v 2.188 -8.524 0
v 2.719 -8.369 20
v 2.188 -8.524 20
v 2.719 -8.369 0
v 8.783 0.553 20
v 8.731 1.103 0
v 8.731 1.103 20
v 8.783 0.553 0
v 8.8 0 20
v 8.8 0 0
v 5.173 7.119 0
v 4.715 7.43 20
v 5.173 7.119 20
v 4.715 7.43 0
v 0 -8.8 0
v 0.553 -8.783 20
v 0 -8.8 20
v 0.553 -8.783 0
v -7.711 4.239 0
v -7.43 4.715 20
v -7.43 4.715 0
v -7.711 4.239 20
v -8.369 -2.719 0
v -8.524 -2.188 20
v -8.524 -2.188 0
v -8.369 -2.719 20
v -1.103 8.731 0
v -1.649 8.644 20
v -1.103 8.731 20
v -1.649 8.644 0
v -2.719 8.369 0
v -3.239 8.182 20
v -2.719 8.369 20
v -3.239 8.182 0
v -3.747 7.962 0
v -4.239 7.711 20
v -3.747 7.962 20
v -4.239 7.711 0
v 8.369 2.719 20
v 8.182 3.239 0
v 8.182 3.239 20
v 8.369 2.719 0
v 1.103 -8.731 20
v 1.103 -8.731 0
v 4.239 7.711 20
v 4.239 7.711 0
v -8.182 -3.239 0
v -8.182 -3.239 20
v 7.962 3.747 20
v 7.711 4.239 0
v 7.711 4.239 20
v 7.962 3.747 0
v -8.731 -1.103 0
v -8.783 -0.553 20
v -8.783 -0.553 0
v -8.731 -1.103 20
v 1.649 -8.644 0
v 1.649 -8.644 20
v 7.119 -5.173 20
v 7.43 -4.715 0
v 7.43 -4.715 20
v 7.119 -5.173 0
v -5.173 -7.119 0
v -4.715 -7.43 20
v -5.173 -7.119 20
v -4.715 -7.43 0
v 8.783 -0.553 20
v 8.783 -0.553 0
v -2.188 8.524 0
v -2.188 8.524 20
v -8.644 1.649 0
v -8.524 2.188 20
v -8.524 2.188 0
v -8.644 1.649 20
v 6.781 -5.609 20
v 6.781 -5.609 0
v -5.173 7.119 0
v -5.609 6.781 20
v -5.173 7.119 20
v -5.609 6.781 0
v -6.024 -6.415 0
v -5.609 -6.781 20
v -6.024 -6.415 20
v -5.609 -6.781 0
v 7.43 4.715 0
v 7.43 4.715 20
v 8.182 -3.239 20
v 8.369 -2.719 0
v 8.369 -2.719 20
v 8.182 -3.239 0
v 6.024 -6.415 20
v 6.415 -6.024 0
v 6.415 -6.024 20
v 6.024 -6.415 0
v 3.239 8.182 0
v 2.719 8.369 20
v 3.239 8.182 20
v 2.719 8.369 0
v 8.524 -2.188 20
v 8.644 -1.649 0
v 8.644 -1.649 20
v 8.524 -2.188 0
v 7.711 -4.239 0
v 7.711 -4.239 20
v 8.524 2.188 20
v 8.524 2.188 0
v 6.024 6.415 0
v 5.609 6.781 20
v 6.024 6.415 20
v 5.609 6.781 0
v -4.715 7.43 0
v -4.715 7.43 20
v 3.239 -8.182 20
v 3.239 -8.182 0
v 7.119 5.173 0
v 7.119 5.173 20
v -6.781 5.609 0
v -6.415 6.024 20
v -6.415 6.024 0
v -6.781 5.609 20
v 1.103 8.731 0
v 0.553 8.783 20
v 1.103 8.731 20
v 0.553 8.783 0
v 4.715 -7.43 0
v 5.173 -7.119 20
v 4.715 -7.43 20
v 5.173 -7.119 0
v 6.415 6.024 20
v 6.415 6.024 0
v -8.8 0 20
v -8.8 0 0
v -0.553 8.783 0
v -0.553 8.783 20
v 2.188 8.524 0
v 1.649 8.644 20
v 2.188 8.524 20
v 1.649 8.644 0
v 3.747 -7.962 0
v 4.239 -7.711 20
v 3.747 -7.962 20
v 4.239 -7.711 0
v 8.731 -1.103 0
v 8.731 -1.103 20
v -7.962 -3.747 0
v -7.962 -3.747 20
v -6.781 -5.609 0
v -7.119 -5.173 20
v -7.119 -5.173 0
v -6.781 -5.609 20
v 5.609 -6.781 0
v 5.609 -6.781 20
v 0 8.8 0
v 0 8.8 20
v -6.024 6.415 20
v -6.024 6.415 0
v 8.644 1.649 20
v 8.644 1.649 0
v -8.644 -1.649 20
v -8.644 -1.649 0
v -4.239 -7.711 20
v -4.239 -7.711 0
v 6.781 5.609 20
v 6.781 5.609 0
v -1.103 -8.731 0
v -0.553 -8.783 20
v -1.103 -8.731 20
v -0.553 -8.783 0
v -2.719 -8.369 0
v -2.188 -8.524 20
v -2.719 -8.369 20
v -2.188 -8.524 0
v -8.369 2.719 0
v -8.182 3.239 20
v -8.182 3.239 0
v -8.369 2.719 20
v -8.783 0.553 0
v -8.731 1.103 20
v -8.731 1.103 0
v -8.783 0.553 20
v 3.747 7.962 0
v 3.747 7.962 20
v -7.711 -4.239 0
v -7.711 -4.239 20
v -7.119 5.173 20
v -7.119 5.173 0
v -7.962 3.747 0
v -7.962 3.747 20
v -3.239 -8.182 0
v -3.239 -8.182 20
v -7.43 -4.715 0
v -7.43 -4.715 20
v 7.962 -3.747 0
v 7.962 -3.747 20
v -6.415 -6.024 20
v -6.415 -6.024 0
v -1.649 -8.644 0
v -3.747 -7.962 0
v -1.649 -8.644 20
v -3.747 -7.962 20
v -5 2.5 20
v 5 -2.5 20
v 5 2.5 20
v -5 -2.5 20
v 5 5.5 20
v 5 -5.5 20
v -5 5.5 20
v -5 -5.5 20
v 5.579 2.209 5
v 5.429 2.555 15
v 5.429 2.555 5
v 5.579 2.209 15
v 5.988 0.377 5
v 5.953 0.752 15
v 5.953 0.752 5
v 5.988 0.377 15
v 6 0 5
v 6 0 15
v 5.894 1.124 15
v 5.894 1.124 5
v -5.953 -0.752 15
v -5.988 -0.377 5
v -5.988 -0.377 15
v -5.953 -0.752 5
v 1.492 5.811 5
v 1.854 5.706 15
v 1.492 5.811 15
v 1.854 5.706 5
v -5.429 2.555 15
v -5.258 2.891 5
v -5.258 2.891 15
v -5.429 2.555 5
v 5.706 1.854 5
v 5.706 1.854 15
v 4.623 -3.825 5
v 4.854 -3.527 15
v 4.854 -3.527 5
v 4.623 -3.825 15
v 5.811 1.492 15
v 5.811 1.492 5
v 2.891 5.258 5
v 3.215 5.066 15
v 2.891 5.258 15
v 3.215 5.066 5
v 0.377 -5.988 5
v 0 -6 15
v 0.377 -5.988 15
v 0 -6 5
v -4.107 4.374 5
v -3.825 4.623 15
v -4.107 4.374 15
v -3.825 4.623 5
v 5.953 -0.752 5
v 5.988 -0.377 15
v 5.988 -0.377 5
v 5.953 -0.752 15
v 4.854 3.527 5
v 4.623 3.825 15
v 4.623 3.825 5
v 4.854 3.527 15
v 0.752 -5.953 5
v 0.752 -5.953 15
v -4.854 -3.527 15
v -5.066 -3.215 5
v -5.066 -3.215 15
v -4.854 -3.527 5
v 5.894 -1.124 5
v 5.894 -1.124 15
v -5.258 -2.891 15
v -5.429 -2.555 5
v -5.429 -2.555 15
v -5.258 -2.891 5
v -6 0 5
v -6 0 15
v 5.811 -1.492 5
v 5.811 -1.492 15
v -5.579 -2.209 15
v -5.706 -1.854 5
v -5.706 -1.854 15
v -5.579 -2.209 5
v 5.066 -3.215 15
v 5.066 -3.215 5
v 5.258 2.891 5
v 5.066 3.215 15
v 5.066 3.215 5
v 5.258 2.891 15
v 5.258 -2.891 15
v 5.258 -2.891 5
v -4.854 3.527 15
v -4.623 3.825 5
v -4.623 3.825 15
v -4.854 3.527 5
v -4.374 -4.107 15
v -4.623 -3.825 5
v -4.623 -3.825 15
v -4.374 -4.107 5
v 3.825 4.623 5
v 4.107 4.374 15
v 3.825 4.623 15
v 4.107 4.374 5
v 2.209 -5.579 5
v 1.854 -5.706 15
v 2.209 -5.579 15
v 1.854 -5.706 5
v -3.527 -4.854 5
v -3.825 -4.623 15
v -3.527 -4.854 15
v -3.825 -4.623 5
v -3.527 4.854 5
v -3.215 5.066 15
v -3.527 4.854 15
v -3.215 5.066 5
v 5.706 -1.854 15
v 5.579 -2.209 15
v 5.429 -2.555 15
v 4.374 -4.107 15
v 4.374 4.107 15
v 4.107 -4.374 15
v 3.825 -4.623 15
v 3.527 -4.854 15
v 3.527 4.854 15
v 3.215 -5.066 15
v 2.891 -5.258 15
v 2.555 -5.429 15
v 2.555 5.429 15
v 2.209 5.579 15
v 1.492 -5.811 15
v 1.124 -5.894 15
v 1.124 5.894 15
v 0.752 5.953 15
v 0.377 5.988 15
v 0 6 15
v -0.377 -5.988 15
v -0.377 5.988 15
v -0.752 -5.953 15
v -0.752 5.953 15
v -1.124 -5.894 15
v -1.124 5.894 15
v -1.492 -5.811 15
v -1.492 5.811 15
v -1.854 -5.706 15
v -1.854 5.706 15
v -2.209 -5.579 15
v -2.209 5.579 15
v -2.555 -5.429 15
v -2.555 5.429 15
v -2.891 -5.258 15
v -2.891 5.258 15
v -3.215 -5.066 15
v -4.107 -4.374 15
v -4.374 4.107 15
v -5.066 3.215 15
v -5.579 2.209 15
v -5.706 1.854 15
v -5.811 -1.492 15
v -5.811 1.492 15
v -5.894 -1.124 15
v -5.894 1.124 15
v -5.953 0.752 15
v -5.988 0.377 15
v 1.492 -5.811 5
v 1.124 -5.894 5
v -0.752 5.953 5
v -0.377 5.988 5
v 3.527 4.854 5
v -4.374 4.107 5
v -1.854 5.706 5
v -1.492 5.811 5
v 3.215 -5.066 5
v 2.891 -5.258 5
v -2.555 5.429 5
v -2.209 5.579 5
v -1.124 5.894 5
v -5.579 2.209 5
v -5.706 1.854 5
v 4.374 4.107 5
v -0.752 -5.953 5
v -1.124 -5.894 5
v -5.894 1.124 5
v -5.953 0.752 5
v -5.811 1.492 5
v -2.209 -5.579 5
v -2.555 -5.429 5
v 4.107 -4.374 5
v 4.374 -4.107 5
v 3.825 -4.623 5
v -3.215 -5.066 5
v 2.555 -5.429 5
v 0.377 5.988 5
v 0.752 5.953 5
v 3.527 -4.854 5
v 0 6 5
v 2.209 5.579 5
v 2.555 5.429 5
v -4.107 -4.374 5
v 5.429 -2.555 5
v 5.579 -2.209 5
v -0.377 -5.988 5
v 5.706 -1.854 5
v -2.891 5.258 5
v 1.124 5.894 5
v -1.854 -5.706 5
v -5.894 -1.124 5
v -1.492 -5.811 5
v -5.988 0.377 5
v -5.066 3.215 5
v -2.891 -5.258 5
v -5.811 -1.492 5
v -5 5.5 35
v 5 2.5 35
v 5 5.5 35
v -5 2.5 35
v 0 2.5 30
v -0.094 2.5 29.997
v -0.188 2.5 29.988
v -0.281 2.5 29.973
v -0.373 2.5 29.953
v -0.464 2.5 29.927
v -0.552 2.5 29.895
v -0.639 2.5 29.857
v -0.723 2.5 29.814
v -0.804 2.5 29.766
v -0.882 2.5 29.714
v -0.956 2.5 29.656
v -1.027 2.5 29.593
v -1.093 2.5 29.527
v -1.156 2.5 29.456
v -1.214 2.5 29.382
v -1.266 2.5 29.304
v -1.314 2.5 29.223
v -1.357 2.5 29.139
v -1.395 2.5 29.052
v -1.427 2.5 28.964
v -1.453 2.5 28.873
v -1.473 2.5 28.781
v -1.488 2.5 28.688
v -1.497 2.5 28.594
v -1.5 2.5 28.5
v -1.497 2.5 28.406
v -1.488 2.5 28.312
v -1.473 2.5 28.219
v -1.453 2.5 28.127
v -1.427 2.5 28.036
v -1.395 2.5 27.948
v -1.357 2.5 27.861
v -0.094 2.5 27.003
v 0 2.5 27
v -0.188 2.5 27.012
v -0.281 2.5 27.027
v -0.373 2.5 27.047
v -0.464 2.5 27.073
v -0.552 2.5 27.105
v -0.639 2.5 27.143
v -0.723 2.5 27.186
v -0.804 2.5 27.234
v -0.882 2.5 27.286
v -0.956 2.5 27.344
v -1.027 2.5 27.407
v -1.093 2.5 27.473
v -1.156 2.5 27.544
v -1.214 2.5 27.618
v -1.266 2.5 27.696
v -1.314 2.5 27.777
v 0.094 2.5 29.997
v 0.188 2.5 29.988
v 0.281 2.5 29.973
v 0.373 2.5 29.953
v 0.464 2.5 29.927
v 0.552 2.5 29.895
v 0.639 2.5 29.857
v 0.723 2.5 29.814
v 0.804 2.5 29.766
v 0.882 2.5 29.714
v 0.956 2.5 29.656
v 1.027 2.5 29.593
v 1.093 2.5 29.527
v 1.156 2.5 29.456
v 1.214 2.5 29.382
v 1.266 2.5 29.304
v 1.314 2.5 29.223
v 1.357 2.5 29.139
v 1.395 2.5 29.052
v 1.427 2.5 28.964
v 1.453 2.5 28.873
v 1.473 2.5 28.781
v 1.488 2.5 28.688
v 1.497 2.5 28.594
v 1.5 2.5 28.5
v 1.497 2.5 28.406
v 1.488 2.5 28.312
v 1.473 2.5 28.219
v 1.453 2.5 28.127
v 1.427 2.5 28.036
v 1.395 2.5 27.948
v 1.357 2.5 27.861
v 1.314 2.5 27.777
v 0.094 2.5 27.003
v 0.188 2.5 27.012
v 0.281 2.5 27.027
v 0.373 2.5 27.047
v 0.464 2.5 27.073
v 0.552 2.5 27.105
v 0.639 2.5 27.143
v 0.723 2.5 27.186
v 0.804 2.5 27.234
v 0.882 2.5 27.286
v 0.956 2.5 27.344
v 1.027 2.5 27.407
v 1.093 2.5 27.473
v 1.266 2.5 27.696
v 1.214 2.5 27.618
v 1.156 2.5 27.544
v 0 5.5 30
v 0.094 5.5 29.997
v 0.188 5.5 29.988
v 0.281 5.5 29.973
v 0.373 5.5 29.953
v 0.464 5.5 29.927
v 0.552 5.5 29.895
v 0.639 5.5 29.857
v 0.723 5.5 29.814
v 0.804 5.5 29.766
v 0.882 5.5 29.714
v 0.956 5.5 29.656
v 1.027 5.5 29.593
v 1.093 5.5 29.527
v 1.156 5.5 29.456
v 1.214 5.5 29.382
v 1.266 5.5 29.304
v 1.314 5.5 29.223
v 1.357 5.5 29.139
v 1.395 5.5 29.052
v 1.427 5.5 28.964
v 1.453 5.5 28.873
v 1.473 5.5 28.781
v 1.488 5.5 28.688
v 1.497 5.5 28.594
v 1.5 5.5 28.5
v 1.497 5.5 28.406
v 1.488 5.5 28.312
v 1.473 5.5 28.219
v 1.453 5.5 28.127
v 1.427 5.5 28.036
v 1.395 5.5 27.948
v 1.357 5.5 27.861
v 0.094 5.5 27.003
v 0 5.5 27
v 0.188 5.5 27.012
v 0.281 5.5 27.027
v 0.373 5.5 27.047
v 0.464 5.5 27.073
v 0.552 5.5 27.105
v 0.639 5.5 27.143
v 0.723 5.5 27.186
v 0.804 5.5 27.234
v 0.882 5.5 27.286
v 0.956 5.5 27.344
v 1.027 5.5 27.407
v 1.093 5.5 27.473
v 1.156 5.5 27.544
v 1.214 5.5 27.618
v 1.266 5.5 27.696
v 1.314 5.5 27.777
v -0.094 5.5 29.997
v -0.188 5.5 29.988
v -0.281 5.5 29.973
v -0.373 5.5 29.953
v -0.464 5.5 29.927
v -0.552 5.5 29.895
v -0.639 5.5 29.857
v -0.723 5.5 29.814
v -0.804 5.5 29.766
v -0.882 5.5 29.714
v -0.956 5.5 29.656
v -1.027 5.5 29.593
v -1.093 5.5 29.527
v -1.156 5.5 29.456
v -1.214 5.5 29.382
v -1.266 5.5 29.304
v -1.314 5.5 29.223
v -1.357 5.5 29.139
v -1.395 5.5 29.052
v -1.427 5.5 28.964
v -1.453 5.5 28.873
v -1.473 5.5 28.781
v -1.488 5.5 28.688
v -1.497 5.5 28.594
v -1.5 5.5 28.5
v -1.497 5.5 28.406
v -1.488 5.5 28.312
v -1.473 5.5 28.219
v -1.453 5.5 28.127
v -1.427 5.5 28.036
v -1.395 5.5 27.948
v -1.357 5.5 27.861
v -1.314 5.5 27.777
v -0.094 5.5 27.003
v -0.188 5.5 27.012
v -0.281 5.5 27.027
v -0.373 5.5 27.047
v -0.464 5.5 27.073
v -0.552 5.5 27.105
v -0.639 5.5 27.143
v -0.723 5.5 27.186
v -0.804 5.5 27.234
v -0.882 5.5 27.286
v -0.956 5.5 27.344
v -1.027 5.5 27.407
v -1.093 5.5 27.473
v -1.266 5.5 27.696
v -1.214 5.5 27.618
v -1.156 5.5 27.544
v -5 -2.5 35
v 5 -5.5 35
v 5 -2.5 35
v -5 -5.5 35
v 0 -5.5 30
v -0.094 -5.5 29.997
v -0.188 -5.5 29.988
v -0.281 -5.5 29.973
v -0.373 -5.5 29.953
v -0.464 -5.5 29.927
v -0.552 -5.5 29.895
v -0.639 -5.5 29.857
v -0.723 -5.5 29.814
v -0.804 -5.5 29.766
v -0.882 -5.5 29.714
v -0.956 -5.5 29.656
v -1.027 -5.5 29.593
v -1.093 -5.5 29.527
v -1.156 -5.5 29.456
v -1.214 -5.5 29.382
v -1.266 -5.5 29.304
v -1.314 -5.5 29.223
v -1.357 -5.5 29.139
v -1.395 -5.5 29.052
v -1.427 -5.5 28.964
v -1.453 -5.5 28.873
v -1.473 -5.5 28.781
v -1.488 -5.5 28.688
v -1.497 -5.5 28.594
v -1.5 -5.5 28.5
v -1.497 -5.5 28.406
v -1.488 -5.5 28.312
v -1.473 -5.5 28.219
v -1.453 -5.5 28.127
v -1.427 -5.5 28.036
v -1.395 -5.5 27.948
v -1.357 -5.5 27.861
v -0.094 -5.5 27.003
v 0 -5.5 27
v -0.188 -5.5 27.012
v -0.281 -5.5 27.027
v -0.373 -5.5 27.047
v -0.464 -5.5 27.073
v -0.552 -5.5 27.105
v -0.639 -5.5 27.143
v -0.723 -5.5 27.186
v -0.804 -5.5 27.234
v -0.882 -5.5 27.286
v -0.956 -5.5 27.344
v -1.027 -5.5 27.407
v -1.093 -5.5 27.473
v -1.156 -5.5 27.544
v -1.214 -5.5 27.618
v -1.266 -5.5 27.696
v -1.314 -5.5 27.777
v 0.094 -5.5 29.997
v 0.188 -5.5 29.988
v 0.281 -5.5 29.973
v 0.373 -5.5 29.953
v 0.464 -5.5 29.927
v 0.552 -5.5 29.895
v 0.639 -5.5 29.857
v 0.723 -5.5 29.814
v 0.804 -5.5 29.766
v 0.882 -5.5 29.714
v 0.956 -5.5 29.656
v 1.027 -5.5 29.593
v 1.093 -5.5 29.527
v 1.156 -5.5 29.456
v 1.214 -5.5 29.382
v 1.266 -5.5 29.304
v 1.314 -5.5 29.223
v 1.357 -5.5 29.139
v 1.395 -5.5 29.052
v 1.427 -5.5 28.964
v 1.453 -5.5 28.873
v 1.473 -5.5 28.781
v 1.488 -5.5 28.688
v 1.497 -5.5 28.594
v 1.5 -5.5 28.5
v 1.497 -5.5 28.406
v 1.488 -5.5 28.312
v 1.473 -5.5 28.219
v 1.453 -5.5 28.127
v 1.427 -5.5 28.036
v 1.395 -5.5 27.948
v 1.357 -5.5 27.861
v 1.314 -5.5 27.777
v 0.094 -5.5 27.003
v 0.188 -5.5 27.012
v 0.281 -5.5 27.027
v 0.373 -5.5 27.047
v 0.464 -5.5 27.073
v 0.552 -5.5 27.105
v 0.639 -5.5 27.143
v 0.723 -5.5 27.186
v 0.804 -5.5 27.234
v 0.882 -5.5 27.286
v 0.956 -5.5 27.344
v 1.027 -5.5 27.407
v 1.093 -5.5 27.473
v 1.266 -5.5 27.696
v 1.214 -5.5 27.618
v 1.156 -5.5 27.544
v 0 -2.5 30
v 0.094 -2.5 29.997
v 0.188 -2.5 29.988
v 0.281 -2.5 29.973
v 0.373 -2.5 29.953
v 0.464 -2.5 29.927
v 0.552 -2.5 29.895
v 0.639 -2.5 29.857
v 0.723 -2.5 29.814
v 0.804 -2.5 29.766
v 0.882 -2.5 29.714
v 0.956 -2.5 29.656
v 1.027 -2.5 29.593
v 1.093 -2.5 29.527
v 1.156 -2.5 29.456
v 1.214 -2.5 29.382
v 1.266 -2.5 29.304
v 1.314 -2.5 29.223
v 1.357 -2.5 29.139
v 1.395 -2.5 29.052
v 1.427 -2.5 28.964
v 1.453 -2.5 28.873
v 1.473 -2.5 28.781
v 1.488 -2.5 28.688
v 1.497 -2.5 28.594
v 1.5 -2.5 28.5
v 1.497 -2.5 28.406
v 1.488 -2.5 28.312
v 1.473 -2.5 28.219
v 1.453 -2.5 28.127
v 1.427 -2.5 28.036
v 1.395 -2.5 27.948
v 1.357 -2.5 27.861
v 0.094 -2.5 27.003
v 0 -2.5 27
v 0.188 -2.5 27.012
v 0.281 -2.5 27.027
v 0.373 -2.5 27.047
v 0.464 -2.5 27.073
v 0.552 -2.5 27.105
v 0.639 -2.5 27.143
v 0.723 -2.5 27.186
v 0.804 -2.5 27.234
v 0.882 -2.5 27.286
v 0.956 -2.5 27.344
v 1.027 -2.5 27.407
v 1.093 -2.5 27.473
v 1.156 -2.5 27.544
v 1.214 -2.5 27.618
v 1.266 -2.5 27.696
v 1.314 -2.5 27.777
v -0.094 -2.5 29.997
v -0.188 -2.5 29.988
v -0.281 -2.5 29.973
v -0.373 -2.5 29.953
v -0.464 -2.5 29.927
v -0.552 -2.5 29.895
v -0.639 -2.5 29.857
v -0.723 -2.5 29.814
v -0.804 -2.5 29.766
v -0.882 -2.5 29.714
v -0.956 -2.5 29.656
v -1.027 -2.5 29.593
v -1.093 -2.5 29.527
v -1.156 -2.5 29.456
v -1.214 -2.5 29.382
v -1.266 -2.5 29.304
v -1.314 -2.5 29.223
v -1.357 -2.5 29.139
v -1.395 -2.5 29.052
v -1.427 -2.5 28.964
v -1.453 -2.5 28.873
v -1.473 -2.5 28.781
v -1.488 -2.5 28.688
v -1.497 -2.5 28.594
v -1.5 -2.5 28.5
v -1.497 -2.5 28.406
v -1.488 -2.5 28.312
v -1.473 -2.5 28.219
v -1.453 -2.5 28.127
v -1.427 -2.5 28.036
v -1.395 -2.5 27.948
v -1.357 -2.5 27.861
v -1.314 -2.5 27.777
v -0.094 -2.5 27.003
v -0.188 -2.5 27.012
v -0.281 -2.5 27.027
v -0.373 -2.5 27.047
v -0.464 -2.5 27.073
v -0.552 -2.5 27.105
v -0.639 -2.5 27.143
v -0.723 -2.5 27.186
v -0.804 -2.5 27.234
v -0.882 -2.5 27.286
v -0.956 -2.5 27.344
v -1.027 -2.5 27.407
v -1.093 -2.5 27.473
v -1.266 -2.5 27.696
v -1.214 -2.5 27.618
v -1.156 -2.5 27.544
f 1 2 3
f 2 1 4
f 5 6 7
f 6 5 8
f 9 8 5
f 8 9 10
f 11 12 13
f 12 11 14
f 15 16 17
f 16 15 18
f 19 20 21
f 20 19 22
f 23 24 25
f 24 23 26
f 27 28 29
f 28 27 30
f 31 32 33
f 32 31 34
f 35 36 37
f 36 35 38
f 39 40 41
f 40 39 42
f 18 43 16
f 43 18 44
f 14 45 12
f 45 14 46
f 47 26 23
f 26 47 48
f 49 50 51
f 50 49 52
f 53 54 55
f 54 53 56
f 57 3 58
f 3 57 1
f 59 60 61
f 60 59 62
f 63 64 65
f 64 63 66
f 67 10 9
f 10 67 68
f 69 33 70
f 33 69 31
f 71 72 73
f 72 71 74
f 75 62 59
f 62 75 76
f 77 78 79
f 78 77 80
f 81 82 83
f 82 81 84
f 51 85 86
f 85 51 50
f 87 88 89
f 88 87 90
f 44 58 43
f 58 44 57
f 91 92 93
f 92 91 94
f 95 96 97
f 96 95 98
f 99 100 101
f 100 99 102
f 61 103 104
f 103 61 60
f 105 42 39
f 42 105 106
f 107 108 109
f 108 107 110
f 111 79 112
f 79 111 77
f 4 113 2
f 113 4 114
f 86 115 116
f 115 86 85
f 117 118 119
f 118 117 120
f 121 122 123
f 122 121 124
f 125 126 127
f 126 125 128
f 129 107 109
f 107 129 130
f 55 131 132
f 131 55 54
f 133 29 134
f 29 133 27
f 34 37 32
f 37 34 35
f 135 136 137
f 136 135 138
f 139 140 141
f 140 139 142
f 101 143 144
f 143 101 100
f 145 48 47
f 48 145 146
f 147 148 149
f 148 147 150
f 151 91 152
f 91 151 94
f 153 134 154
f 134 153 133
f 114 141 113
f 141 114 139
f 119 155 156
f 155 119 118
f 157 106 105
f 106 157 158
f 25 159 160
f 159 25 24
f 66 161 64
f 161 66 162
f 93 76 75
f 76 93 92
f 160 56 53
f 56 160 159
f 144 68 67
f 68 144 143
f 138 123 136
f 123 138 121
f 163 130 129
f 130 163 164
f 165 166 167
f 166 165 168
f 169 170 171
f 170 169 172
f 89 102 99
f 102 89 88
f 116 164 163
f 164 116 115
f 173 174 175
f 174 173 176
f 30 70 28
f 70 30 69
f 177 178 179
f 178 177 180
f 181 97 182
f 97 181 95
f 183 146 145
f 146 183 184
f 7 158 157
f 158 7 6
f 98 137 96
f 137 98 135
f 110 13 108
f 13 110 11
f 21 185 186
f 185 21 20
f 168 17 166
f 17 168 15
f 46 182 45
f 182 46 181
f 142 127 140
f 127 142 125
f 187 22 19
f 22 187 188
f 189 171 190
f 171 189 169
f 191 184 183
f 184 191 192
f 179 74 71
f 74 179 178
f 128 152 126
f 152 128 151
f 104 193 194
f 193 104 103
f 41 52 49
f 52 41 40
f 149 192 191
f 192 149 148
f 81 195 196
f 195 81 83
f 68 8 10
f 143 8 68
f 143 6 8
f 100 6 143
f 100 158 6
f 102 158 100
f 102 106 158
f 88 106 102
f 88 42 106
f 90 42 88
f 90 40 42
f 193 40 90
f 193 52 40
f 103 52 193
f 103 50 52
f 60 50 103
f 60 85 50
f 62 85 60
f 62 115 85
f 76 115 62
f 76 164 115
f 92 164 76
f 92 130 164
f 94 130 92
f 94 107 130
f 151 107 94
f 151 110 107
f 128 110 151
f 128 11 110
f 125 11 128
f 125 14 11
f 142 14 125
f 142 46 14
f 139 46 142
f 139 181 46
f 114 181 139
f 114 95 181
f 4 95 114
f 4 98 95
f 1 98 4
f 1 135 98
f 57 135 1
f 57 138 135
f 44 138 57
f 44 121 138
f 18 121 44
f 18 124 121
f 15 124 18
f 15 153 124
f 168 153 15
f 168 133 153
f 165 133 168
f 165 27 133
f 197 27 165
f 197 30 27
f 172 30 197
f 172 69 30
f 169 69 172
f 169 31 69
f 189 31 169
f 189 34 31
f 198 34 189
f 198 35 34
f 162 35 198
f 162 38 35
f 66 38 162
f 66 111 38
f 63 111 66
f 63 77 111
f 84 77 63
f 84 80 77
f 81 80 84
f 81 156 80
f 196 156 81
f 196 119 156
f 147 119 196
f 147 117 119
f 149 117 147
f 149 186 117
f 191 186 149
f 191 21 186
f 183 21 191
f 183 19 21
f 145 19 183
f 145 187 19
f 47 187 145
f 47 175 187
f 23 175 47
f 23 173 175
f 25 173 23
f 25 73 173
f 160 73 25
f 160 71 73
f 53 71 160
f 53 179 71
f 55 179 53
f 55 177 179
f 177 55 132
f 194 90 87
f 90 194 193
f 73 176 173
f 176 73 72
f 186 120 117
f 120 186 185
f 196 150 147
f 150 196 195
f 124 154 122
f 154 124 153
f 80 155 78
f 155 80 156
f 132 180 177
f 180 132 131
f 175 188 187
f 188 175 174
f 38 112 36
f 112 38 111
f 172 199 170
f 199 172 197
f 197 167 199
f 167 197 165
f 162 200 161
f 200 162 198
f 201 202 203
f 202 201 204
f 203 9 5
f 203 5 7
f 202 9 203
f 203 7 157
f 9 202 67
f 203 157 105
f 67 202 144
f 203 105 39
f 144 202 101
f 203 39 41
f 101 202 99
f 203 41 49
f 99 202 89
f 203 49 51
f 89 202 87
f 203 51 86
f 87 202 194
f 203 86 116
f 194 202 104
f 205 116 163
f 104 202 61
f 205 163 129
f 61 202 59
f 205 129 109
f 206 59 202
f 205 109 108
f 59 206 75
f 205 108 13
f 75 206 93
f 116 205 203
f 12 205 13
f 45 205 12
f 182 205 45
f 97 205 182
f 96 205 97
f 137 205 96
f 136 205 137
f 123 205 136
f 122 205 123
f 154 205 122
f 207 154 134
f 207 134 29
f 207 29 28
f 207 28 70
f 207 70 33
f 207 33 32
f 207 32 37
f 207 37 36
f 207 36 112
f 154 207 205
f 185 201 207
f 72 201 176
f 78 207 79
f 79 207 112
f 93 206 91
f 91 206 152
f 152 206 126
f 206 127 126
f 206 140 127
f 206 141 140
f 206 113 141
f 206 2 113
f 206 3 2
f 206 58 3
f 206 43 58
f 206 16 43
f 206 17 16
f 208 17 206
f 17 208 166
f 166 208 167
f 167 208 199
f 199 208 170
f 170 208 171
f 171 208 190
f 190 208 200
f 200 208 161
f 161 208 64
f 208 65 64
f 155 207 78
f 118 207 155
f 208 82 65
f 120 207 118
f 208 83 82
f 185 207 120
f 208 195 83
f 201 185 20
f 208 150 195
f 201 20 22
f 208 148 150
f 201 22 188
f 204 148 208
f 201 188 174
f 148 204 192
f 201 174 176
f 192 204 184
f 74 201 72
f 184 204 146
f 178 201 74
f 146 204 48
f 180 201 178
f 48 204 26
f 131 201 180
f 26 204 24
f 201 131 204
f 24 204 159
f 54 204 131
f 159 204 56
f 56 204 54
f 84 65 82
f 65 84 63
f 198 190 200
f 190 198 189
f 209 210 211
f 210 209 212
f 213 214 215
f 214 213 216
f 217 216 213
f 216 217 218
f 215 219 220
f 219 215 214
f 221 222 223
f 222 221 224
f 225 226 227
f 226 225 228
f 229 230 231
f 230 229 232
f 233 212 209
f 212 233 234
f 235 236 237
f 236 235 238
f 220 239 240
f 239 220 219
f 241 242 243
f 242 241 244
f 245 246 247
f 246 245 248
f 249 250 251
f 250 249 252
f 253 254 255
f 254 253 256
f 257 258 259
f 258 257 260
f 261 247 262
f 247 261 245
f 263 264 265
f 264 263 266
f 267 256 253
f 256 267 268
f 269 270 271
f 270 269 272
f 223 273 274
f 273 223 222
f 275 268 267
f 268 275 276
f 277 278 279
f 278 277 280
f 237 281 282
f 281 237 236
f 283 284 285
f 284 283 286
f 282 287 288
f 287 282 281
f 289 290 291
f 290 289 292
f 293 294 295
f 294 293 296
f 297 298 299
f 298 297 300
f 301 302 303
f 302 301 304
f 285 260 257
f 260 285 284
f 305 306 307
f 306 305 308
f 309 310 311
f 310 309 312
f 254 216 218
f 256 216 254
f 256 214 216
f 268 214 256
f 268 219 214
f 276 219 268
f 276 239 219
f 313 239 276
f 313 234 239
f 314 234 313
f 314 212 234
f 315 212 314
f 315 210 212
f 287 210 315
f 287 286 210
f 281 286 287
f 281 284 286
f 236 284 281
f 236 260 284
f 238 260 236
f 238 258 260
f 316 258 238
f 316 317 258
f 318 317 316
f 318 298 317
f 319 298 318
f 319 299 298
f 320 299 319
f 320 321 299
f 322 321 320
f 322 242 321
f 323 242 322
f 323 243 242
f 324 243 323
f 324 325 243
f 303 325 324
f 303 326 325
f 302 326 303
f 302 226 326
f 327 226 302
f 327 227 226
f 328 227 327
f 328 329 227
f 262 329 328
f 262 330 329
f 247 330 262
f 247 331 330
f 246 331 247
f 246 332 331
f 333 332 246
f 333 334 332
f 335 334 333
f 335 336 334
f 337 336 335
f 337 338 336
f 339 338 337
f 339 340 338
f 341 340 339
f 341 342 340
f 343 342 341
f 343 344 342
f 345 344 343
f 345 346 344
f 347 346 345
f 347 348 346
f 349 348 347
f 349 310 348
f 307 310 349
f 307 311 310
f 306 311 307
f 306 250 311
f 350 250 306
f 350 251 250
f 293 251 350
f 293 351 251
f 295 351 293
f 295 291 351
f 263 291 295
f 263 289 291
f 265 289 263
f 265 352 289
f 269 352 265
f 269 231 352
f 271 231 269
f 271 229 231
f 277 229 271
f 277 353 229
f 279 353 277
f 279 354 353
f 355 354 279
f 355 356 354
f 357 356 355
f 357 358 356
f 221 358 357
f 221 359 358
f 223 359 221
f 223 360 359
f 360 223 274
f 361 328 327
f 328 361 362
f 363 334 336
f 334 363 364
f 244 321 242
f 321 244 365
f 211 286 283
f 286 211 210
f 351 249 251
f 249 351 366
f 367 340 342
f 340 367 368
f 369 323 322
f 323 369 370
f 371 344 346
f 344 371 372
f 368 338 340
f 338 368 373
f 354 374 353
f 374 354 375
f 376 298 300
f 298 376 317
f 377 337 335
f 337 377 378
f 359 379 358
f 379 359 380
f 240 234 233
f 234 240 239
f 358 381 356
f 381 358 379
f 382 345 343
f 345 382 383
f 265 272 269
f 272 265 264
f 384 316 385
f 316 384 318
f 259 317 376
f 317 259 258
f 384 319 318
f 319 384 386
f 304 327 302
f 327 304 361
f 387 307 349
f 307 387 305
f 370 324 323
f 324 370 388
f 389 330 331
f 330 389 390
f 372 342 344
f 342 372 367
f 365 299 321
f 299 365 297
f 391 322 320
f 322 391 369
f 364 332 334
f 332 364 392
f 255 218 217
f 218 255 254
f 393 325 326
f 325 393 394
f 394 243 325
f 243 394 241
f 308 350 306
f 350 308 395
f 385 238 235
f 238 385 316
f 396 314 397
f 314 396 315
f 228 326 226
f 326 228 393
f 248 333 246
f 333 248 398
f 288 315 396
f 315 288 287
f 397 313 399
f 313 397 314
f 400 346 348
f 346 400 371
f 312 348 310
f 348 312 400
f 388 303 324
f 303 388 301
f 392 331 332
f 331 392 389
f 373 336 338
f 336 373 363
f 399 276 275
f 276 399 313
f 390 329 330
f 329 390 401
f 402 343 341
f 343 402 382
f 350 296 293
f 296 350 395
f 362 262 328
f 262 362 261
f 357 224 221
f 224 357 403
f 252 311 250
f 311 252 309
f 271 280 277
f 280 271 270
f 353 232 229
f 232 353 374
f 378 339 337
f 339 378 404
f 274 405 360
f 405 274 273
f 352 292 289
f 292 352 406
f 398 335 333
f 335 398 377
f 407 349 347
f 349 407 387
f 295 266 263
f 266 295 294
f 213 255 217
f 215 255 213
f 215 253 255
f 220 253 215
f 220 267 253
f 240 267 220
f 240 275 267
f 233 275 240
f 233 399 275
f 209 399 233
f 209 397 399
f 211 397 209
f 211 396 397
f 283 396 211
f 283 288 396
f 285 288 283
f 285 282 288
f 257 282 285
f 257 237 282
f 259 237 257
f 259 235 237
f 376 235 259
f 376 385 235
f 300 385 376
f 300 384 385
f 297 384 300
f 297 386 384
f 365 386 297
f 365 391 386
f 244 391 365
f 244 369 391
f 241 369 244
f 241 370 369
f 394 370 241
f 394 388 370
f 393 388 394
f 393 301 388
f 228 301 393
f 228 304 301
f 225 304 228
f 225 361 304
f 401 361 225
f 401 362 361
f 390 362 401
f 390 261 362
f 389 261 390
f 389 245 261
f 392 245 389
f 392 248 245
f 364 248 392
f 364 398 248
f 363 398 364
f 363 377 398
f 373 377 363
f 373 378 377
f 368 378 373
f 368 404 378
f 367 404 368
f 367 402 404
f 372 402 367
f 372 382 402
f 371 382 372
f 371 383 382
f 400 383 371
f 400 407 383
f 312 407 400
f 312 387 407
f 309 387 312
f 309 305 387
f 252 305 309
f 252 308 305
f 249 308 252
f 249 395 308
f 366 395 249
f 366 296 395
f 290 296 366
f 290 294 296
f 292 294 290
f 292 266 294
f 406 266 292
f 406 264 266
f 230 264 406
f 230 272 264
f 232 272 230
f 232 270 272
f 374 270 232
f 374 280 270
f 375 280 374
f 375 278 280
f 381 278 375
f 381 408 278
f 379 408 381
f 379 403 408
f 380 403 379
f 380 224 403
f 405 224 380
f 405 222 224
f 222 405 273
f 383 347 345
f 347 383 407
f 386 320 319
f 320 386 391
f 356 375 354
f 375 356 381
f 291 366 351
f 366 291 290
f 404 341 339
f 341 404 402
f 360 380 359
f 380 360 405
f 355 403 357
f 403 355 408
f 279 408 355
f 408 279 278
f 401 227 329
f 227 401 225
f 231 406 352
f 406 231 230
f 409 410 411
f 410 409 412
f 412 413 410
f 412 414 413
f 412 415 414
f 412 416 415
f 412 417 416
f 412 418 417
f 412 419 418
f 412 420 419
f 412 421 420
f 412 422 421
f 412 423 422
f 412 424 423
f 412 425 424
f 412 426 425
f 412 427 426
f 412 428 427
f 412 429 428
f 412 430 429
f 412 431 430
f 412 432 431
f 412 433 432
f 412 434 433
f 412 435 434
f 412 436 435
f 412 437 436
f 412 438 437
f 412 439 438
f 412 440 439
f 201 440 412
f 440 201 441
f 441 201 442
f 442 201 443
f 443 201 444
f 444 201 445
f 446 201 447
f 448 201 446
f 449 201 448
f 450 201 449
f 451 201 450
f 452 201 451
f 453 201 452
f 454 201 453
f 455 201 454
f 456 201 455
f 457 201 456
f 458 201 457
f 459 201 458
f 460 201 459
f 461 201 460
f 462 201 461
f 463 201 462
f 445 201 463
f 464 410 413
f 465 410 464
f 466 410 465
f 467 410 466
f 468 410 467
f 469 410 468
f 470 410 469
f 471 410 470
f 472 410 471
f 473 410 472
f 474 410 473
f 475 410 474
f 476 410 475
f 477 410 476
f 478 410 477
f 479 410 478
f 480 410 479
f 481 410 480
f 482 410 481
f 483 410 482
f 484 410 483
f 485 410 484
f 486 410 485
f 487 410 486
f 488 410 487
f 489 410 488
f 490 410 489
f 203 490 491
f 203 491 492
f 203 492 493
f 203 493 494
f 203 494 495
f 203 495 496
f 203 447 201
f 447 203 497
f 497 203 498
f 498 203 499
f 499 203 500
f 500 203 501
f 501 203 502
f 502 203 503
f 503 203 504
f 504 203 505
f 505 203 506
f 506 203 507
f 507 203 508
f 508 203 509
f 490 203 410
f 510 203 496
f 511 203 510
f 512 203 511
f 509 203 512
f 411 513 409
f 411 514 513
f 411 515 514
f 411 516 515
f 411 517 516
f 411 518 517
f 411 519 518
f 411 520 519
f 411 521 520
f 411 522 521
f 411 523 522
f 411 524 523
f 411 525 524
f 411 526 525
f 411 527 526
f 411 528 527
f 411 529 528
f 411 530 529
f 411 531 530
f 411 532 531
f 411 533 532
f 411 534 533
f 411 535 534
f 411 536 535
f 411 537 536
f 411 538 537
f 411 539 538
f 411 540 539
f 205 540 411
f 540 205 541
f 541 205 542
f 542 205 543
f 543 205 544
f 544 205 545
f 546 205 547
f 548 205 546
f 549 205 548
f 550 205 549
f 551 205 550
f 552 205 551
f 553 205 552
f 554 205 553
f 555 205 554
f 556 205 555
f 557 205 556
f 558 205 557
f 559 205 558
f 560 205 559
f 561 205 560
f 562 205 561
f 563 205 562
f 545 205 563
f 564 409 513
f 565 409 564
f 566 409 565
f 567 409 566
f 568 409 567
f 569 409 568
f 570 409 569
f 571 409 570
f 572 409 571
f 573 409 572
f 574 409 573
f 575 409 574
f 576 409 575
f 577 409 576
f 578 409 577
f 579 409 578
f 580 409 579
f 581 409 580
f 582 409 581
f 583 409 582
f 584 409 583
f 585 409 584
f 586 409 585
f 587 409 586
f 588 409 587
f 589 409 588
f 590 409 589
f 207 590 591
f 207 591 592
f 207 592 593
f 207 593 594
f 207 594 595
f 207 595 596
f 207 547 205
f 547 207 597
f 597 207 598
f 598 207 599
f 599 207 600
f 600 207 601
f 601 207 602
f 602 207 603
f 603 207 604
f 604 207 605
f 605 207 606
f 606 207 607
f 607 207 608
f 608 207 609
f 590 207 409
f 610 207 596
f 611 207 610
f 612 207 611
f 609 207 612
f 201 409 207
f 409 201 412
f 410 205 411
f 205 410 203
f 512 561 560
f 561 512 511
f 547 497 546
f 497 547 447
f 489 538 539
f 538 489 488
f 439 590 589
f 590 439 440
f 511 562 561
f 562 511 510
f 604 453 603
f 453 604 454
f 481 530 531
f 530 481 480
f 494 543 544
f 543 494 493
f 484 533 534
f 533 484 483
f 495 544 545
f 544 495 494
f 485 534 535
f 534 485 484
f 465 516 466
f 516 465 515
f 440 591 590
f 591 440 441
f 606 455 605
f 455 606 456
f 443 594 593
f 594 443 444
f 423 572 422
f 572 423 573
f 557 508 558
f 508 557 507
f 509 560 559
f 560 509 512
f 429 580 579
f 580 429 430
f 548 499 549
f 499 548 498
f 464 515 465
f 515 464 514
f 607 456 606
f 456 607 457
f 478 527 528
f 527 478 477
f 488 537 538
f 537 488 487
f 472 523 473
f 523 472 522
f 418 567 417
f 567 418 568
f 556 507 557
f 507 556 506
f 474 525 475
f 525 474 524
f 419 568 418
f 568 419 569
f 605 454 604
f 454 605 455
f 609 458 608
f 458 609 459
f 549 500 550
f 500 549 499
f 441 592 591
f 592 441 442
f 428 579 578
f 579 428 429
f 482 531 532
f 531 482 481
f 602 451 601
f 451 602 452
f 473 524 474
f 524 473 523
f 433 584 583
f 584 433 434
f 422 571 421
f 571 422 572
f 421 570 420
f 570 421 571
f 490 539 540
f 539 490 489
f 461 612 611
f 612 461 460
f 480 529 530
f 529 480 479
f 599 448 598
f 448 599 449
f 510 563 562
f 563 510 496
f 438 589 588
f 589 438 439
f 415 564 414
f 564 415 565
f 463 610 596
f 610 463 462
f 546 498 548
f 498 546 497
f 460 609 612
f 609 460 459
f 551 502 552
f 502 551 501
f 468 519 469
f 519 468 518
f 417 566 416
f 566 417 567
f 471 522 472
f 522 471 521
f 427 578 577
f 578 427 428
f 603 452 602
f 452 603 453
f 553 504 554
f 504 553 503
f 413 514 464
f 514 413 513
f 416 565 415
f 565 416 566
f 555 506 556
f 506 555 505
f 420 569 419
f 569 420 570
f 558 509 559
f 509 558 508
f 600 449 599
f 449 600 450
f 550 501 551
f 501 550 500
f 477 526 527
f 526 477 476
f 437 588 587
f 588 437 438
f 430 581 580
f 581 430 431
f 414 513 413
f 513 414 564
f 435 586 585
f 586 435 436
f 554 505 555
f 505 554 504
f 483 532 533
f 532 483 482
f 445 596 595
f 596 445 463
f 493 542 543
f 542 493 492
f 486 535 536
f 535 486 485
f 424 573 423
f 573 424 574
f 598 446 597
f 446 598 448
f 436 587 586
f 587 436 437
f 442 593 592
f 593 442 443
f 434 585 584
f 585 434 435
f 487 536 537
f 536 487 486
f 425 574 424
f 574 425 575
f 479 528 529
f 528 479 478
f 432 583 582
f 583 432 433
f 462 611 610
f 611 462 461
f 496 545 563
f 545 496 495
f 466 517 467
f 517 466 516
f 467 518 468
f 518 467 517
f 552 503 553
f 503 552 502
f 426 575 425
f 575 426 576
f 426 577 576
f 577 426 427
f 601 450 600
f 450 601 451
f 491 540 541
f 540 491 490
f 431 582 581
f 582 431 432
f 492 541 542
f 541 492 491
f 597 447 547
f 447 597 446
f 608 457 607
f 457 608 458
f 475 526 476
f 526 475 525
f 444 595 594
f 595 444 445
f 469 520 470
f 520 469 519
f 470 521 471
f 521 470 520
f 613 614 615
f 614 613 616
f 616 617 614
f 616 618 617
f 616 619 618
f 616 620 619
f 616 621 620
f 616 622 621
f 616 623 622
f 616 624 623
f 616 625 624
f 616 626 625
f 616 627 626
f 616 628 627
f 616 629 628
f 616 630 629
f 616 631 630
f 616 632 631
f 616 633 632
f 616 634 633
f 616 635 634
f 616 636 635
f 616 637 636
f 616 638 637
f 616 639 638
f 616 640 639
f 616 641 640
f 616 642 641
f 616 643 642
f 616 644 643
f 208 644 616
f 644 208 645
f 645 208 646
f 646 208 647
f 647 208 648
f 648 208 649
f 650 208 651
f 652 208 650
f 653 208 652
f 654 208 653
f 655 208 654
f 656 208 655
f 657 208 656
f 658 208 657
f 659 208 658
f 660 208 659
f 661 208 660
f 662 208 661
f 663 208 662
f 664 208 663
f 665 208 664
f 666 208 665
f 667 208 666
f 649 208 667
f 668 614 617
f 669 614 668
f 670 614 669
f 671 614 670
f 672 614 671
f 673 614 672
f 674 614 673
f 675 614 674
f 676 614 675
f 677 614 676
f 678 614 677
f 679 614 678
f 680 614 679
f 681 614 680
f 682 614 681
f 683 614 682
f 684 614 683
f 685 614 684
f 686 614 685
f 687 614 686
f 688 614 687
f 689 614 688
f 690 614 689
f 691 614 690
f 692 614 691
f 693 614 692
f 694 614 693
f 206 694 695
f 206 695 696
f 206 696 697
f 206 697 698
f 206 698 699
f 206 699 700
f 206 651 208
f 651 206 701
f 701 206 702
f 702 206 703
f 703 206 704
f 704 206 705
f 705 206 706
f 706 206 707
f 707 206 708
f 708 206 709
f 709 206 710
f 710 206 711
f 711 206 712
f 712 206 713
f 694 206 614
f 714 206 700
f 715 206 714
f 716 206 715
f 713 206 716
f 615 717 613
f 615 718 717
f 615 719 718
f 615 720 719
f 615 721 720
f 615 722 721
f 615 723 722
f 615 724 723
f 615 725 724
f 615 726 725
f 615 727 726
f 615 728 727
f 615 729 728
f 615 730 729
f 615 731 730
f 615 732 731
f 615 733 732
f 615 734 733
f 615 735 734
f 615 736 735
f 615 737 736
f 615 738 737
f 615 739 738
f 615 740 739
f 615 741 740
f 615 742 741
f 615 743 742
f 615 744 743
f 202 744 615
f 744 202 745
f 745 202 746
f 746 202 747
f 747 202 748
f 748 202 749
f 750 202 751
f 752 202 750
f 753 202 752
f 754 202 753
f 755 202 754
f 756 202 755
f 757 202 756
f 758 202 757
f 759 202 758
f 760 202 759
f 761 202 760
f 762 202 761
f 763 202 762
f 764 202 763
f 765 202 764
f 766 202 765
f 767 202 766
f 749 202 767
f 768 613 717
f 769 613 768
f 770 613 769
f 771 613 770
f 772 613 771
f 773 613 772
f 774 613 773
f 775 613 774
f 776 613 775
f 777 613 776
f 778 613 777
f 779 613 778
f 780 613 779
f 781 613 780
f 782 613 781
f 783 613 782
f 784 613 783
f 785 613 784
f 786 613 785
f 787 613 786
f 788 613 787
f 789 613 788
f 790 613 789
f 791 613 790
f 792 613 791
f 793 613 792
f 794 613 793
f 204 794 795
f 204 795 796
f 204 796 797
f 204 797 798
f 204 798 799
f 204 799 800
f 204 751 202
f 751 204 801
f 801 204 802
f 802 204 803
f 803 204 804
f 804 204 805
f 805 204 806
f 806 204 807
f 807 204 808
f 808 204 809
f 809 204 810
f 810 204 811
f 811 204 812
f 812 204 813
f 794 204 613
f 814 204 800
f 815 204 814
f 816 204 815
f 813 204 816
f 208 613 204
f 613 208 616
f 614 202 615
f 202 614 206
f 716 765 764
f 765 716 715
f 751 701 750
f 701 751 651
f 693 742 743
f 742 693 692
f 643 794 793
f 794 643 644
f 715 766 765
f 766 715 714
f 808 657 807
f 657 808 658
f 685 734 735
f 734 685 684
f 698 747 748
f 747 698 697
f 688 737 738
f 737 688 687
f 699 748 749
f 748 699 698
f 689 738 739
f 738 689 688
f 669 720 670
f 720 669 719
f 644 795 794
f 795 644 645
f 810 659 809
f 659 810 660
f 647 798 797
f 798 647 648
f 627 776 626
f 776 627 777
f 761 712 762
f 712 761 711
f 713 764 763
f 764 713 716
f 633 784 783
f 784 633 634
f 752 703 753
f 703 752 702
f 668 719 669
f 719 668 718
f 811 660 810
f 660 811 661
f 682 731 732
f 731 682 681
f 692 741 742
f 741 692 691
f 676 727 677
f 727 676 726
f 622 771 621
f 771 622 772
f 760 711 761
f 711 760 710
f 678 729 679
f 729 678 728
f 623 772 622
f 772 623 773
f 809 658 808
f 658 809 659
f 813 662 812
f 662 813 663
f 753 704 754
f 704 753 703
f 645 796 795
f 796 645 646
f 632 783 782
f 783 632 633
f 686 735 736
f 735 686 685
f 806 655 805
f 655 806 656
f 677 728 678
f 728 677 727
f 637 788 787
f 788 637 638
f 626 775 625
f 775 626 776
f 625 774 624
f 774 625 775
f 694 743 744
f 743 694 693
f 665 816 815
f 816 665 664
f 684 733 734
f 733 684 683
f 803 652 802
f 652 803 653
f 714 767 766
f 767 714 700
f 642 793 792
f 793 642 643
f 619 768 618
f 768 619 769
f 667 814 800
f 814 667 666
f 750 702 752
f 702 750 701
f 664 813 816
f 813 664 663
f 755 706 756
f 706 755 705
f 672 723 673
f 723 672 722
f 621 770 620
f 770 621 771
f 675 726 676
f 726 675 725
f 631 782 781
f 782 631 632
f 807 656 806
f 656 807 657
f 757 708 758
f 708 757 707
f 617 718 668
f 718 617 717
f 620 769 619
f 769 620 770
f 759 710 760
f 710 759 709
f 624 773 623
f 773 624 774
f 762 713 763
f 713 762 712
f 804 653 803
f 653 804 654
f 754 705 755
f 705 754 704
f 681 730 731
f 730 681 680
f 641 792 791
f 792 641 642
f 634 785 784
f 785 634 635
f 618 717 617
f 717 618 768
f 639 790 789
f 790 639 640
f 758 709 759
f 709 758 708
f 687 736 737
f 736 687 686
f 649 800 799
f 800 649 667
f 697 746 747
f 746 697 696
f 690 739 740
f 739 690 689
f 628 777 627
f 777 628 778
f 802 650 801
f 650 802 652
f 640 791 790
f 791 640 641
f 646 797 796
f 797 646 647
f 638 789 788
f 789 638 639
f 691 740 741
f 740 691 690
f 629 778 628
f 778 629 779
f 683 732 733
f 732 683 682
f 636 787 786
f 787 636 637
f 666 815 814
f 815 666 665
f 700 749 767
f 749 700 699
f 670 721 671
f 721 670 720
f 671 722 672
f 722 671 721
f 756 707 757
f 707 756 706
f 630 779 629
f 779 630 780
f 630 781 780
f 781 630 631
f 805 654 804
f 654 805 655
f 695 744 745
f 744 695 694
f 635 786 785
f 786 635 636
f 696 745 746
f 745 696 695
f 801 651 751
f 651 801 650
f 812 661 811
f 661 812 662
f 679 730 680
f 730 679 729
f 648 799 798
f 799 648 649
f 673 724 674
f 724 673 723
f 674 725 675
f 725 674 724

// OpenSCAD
//*******************************************************
// ********** Prusa Rounded Clip by MacFly **************
// **            made dec 02 2015                      **
//*******************************************************

//--------------------------------------------------------------------------------------//
$fn = 100;
CYLINDER_HEIGHT = 20;         // cylinder height mm - Hauteur du cylindre en mm
CYLINDER_RADIUS = 8.80;      // cylinder radius mm - Rayon du cylindre en mm
TAB_LENGTH = 15;            //  Tab length - longueur de la languette en mm
TAB_THICKNESS = 3;         // 5mm thickness - Epaisseur de la languette
TAB_WIDTH = 10;           // Tab width mm - Largeur de la languette en mm
SCREW_HOLE_RADIUS = 1.5; // screw hole radius - Diamètre du trou pour la vis
SCREW_HOLE_OFFSET = 5; // tab screw hole 5mm from the edge - distance du trou 5mm du bord extérieur
EXTRUSION_THICKNESS = 6; // 8.80 - 6 = 2.8 / 2 = 1.4mm shell thickness - Epaisseur de l'extrusion intérieur du cylindre

module Maincylinder()
    {
    difference(){
        
            cylinder(r=CYLINDER_RADIUS, h=CYLINDER_HEIGHT);
            translate([0,0,5]) ExtruCylinder();
        }
        
      
        
    }
module ExtruCylinder()
    {    
            #cylinder(r=EXTRUSION_THICKNESS, h=CYLINDER_HEIGHT - 10);  
    }
module tab()
    {
        
    difference() 
        {
            translate([0,0,0]) rotate([90,90,0]) cube([TAB_LENGTH,TAB_WIDTH,TAB_THICKNESS]);
            translate([5,75,-SCREW_HOLE_OFFSET - 1.5]) rotate([90,90,0]) #cylinder(r=SCREW_HOLE_RADIUS,h=150);
        }
    }


Maincylinder();
    translate([-TAB_WIDTH/2,TAB_THICKNESS + 2.5,CYLINDER_HEIGHT + TAB_LENGTH]) tab();
    translate([-TAB_WIDTH/2,-2.5,CYLINDER_HEIGHT + TAB_LENGTH]) tab();

